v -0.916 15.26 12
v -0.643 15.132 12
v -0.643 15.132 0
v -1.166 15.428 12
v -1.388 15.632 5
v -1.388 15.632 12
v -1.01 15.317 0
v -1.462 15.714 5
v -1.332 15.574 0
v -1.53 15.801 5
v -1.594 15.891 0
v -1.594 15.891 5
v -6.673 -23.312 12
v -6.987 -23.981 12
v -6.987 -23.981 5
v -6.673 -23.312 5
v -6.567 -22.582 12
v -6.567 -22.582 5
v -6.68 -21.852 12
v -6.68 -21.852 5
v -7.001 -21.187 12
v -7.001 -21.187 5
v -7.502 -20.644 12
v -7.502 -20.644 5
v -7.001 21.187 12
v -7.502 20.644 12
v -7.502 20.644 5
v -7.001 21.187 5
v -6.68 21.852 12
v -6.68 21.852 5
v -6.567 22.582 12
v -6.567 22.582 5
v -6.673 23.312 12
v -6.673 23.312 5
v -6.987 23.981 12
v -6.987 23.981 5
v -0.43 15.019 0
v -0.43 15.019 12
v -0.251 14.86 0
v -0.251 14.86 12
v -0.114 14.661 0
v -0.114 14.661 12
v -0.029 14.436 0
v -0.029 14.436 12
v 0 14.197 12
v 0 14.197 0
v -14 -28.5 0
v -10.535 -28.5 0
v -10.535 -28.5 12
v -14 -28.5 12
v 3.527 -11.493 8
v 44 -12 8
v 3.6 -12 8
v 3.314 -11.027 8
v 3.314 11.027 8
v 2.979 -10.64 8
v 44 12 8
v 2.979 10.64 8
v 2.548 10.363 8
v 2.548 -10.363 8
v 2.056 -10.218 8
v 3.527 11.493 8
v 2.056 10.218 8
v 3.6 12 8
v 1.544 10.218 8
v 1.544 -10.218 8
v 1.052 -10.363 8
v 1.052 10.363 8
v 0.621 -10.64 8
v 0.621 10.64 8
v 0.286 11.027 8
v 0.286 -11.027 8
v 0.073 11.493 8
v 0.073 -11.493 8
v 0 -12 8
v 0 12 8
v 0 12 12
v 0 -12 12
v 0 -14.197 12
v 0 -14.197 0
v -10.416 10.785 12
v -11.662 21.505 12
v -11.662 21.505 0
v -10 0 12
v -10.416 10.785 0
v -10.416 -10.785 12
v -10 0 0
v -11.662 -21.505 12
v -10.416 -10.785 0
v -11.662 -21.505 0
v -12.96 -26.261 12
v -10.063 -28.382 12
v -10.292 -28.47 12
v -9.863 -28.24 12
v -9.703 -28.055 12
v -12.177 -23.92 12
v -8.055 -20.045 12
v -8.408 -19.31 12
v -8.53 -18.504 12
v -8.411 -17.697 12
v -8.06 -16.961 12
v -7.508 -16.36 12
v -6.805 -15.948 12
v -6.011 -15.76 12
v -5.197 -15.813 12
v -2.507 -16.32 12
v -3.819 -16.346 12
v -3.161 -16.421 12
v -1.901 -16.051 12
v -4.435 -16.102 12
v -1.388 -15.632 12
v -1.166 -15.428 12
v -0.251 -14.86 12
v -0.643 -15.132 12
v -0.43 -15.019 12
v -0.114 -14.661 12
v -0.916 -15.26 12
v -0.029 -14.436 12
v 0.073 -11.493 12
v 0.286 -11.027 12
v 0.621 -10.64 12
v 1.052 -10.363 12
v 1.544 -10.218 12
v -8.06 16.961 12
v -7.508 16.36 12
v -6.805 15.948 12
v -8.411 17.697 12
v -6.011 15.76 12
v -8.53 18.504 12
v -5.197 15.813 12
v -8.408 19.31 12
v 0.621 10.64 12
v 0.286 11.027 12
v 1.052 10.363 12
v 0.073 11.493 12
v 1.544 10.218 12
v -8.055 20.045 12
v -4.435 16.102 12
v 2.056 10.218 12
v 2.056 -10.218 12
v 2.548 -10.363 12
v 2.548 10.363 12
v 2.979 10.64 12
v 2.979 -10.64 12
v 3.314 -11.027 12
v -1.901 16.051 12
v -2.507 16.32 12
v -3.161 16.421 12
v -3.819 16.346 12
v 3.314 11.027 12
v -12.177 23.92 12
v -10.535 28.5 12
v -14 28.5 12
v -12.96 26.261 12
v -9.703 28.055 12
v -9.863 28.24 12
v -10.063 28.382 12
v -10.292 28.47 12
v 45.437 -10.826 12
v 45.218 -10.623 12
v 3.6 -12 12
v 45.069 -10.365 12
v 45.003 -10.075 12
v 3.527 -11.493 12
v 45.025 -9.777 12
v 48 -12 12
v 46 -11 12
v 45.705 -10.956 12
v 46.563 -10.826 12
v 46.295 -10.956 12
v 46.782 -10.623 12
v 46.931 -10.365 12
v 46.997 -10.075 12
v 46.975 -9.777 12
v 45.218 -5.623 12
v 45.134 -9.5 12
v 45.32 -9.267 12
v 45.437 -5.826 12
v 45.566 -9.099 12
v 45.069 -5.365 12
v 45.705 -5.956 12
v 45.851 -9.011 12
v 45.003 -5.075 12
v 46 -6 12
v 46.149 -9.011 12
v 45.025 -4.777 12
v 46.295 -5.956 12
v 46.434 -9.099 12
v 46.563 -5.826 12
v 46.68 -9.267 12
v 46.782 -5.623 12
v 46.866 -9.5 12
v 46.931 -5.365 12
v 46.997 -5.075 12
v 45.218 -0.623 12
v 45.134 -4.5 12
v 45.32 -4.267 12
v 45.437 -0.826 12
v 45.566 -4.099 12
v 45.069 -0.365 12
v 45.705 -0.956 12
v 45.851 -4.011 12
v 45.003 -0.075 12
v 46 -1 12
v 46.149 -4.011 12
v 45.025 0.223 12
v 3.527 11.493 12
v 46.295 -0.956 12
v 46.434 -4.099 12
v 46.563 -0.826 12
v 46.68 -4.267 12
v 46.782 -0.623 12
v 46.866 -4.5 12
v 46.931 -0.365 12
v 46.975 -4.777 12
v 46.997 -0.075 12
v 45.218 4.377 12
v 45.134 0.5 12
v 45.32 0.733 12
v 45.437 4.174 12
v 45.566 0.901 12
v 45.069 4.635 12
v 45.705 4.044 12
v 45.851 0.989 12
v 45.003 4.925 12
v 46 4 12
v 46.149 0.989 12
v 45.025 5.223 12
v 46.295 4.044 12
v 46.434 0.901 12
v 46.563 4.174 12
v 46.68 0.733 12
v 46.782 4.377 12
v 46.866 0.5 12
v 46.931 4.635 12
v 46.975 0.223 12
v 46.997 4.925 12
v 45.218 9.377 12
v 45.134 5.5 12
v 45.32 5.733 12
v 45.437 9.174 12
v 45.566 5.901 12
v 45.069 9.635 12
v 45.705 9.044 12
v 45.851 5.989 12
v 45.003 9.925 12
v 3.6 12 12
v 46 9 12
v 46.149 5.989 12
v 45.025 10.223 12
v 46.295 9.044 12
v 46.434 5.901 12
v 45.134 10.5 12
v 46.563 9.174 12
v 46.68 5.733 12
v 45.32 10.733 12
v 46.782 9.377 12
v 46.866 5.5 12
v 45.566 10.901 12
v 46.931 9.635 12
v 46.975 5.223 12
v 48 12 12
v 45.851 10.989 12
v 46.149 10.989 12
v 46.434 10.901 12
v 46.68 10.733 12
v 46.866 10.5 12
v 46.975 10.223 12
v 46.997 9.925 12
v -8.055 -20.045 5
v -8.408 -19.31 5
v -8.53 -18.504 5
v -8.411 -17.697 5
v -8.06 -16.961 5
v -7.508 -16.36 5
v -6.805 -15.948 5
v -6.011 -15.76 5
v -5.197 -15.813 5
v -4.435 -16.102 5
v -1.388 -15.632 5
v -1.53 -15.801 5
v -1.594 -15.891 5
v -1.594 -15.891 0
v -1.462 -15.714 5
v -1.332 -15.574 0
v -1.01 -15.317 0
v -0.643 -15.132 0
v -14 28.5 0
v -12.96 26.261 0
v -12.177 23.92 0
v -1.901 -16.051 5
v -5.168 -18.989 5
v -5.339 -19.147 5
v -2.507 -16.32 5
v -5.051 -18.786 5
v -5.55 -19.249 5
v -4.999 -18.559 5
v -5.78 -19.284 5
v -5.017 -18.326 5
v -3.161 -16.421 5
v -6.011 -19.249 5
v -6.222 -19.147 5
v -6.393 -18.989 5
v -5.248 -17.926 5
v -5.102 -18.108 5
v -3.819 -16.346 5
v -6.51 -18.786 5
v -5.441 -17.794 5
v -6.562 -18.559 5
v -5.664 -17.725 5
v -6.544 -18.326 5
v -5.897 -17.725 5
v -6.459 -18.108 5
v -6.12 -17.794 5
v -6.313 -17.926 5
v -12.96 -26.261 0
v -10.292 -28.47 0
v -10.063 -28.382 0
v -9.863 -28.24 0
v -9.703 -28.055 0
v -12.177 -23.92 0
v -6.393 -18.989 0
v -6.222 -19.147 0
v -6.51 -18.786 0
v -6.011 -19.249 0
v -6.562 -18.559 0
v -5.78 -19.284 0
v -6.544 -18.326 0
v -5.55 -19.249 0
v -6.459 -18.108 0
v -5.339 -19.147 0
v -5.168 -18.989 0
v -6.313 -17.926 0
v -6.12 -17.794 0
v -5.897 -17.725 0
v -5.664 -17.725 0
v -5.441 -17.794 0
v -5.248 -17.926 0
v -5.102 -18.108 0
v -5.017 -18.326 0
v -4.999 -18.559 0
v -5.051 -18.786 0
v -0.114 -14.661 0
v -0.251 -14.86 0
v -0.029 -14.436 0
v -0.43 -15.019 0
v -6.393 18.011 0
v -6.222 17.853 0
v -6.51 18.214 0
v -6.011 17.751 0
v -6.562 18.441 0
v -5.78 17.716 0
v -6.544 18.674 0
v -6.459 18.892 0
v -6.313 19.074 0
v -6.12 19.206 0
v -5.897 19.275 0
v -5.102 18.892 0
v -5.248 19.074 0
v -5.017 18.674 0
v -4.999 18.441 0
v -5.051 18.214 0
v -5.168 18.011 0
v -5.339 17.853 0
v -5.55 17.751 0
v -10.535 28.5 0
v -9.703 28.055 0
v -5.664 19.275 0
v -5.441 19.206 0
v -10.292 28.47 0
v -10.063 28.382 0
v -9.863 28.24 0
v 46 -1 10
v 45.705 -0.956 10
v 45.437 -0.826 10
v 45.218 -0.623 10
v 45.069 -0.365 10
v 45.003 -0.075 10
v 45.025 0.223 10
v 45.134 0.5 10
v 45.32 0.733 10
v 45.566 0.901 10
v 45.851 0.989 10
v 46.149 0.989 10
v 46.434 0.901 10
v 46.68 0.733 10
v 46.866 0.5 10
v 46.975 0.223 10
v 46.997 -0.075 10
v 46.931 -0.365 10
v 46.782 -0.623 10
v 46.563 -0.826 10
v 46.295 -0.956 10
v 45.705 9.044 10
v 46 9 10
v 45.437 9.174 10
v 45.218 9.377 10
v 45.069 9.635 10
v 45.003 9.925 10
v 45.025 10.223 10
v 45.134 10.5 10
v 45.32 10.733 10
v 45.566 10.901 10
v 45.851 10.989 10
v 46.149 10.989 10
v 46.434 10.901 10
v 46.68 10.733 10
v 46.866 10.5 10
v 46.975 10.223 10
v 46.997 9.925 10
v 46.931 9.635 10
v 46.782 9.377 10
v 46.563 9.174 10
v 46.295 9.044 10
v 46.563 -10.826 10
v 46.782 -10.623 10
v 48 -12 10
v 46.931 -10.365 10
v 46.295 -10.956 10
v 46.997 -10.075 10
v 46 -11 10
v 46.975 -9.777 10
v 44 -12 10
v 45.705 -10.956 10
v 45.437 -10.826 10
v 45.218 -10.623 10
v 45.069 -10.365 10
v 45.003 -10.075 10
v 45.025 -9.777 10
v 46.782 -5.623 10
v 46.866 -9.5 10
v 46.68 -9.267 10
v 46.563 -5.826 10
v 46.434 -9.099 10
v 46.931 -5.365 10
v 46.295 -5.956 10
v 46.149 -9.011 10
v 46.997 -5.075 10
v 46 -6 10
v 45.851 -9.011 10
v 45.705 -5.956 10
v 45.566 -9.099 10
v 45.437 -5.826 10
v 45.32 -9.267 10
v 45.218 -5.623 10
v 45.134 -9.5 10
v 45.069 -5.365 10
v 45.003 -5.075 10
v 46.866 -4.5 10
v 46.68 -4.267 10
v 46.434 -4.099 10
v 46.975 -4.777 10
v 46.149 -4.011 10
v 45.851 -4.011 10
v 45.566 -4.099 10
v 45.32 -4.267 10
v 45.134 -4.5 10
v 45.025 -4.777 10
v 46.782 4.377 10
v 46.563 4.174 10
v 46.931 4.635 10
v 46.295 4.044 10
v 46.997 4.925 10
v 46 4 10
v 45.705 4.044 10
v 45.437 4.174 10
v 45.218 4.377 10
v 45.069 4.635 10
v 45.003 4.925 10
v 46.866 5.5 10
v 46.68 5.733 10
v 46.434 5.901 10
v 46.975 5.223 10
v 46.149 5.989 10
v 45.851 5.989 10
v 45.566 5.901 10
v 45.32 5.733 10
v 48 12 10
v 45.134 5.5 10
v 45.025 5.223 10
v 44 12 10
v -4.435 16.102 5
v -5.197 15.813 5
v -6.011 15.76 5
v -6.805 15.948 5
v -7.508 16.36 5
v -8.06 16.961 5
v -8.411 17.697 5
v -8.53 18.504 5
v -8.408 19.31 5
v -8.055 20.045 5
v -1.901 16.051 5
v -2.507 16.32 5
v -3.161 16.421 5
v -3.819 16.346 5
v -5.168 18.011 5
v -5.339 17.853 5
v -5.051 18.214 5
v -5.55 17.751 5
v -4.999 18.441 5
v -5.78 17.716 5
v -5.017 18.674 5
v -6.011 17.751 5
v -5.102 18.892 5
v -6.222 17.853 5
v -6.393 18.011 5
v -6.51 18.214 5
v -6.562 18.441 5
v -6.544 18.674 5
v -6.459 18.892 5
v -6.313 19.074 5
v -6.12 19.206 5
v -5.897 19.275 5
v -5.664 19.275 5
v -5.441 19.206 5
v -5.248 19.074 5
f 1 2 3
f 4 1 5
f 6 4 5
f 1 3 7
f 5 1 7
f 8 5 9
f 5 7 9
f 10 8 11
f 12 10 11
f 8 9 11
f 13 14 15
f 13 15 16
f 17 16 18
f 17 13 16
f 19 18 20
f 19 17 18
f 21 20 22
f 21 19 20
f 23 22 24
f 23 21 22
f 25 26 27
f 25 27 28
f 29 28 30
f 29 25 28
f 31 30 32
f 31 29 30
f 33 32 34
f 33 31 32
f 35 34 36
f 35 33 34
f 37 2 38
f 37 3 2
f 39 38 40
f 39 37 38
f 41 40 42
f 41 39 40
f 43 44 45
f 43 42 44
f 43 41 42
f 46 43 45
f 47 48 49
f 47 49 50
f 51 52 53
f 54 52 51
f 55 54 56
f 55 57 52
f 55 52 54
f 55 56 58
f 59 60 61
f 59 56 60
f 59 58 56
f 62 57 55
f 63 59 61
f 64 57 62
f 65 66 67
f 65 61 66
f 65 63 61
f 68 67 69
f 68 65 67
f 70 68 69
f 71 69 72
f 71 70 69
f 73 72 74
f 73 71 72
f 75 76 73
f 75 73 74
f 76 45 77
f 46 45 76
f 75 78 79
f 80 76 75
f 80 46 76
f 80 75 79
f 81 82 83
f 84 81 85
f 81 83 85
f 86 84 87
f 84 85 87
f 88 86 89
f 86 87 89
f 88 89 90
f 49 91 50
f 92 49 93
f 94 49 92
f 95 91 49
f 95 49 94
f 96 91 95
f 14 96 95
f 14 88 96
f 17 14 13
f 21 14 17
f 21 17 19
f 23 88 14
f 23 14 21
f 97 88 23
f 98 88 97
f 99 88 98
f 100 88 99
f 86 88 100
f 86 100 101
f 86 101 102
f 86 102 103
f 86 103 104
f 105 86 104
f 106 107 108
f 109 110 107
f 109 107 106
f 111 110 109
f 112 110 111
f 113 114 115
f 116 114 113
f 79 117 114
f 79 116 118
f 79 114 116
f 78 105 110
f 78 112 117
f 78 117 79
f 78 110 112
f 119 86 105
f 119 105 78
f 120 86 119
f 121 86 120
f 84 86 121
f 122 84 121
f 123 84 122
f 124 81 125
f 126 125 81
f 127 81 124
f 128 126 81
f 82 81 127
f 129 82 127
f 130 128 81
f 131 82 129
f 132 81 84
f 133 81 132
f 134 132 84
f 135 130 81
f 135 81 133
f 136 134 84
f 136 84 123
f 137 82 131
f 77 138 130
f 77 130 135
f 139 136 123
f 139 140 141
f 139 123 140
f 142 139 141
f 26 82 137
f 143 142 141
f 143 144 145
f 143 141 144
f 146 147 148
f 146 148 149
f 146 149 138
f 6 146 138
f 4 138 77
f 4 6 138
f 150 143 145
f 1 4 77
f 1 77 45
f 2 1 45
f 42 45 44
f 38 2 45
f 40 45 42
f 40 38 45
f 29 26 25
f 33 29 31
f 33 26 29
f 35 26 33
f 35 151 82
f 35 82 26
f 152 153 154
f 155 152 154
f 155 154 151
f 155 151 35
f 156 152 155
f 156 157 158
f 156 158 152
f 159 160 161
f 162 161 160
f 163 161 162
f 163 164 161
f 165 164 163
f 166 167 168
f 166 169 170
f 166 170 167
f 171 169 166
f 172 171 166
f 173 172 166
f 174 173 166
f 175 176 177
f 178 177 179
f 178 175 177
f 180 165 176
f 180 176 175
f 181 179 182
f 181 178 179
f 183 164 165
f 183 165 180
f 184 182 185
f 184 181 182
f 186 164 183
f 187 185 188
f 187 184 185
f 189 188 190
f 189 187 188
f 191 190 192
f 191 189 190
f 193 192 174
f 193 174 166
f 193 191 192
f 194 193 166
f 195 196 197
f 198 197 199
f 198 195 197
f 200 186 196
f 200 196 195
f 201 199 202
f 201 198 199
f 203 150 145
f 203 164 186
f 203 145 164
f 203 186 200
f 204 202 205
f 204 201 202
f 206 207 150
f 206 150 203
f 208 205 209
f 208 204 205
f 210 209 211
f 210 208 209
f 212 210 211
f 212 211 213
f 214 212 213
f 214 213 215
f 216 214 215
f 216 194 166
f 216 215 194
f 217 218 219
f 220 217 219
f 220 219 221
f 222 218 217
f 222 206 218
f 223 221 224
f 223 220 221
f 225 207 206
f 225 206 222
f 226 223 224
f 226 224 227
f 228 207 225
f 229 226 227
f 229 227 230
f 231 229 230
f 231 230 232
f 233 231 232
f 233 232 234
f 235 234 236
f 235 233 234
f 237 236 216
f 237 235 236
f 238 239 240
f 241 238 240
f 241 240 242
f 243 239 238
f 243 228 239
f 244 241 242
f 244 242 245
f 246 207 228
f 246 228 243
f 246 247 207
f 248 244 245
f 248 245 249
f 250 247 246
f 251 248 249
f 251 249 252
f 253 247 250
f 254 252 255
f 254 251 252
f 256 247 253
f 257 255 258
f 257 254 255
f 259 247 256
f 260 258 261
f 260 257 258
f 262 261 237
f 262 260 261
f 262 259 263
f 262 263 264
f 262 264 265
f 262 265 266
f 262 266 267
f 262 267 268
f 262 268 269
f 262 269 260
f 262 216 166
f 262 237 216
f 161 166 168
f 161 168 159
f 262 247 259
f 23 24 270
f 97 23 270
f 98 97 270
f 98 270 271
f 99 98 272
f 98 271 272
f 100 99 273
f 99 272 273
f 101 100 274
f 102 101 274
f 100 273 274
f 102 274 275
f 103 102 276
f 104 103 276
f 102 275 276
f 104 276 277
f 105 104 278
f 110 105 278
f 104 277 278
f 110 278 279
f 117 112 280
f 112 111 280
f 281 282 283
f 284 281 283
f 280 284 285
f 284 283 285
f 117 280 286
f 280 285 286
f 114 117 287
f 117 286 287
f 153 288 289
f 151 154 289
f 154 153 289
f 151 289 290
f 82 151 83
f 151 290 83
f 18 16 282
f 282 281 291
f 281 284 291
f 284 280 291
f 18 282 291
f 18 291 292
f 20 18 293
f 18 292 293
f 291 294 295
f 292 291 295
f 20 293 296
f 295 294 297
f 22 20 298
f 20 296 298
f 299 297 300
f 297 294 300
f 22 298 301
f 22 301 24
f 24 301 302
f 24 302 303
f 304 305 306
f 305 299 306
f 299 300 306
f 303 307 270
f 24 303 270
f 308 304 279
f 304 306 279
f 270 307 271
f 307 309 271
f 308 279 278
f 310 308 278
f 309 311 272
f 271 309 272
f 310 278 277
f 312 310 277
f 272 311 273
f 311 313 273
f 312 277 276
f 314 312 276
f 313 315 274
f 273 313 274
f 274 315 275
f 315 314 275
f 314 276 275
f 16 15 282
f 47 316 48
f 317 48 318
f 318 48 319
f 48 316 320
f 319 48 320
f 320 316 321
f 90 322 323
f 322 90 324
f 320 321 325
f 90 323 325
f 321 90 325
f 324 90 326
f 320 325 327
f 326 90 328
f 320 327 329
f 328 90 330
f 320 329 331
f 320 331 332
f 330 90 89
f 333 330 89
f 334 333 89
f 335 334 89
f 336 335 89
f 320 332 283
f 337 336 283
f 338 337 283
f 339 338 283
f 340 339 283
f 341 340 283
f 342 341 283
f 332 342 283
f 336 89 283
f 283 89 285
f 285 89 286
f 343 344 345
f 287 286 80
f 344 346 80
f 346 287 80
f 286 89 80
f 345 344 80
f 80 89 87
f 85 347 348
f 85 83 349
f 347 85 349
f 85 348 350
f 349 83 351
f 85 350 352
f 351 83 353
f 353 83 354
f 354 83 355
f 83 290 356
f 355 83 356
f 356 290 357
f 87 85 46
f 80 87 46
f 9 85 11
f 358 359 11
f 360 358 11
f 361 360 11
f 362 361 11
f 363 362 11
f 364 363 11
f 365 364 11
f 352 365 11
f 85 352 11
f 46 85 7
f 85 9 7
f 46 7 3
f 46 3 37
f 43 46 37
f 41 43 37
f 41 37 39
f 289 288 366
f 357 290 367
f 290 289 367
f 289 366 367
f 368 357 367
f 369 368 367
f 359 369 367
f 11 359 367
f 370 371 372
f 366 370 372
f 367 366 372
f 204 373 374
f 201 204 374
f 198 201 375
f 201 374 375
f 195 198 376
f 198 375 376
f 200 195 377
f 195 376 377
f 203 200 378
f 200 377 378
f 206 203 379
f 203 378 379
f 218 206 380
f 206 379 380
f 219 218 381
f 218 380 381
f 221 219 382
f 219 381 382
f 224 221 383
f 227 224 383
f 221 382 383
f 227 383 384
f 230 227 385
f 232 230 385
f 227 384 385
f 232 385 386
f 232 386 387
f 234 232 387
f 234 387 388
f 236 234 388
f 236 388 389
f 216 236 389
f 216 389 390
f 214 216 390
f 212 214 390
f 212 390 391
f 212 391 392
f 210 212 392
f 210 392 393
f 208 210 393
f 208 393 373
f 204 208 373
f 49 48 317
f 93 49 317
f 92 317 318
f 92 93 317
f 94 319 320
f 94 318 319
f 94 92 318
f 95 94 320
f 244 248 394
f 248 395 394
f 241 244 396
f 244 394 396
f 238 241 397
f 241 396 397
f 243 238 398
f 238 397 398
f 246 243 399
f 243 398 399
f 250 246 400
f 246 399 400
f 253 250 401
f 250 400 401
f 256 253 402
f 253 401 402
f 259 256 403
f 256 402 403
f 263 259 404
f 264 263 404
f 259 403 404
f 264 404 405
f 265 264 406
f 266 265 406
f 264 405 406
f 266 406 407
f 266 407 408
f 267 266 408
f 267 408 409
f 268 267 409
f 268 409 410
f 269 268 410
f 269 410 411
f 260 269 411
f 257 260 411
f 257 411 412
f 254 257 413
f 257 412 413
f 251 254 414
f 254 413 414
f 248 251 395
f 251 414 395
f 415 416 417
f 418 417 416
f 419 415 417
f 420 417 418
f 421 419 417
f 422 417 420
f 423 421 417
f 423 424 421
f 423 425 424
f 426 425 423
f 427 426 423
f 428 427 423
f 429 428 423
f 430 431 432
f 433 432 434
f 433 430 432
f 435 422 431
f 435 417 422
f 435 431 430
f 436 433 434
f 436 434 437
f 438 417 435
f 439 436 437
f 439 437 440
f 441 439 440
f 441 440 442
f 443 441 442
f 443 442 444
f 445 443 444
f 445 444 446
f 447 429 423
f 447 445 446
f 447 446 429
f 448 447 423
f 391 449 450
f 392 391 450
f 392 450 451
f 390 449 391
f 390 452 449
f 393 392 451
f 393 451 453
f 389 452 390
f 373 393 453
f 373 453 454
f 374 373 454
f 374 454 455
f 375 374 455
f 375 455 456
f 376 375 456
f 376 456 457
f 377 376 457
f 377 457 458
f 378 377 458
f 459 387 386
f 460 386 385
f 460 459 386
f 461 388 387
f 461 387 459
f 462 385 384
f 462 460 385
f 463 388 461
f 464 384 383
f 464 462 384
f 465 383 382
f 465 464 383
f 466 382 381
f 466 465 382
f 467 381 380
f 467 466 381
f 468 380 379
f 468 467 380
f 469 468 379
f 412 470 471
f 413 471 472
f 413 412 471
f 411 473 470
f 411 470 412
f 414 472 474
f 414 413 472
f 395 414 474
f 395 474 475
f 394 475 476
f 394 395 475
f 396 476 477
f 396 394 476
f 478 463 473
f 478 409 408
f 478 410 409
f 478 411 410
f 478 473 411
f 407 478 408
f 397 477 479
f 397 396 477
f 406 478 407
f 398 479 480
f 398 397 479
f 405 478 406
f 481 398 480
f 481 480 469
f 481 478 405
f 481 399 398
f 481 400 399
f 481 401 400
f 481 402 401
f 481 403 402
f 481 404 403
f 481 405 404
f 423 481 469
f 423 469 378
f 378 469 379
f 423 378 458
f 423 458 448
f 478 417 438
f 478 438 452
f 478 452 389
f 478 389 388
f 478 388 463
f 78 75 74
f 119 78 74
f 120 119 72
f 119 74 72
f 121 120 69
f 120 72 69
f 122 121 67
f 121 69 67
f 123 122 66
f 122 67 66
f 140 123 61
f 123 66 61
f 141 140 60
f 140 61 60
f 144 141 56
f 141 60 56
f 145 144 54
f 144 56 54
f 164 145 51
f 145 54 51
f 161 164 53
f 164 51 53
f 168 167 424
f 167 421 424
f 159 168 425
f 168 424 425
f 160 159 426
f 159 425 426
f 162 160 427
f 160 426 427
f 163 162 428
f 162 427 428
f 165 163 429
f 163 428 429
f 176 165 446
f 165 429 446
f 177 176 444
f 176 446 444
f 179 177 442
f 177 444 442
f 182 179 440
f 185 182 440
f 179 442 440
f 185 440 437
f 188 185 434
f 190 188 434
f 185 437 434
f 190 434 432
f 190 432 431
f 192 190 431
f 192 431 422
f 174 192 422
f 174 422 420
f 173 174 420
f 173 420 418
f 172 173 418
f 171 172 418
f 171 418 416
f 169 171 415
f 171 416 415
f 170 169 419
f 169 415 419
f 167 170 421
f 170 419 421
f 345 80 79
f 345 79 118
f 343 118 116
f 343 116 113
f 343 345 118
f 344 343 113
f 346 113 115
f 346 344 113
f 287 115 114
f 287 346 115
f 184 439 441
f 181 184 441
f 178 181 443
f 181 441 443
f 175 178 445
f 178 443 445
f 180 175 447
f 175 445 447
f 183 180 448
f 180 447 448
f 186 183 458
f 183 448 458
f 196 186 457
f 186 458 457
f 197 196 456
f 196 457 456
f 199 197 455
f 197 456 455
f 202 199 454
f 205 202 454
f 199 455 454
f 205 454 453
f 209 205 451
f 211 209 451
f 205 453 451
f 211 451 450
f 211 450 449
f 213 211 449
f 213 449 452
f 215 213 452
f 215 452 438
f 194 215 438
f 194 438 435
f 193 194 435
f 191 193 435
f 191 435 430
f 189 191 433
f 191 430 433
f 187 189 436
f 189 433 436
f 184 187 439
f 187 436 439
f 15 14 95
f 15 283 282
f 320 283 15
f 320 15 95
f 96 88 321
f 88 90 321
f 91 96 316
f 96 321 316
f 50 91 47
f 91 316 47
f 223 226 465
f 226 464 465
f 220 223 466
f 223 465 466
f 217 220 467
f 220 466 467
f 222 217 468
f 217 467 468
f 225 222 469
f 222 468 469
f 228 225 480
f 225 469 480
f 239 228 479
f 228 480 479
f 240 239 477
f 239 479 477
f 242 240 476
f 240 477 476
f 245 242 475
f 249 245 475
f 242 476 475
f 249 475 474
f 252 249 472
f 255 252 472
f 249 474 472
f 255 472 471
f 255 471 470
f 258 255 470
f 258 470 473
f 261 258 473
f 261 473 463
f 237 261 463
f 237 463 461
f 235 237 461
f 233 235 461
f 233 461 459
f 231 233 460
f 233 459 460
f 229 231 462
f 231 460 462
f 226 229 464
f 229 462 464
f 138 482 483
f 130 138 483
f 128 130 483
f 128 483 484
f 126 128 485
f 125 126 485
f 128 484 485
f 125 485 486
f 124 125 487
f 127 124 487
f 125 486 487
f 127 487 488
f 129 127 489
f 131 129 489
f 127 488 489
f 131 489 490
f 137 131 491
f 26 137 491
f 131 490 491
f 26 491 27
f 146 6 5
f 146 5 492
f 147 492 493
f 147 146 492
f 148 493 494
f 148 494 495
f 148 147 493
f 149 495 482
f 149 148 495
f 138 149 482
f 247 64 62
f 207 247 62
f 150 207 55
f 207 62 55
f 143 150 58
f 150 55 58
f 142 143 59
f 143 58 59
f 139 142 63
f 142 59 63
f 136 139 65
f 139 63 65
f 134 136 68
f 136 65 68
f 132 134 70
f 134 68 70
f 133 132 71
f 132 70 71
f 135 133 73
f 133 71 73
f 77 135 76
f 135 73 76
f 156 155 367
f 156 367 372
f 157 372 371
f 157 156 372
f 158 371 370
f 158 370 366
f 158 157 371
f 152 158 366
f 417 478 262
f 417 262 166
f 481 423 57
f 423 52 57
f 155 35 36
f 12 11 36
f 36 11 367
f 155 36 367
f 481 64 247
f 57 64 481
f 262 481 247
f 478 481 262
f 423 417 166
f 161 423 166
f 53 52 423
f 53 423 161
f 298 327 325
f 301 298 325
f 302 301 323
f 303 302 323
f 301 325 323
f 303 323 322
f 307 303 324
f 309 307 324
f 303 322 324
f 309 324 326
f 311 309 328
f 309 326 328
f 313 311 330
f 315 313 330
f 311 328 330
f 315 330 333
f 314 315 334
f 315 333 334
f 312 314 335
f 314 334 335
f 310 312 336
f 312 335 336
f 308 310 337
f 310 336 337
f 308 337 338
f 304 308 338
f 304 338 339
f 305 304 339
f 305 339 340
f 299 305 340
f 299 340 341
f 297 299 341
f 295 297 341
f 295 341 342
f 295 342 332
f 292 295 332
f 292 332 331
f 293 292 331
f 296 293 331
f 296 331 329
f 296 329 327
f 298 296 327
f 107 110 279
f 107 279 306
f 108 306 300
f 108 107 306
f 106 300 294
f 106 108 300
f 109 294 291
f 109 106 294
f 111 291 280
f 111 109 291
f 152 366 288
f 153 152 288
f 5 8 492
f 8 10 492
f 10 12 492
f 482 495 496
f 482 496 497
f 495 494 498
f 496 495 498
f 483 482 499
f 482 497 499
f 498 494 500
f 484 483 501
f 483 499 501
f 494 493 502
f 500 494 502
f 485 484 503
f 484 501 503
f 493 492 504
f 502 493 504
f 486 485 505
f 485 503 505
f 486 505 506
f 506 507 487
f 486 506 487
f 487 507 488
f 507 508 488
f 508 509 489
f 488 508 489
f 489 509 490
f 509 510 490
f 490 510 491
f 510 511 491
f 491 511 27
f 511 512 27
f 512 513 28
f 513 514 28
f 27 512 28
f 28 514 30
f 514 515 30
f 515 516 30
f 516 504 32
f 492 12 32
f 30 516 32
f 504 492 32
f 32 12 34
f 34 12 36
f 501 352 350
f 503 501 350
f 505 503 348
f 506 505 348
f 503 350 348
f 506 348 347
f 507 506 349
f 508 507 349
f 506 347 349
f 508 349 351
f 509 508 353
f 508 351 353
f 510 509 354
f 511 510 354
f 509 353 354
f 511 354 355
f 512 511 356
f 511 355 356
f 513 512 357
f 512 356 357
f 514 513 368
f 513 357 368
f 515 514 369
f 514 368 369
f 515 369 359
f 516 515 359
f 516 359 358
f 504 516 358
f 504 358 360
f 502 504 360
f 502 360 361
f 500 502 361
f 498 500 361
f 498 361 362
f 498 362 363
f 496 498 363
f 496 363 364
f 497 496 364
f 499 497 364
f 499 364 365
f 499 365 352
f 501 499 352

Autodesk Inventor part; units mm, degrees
ref_plane "YZ Plane" through (0, 0, 0) normal (1, 0, 0) x (0, 1, 0)
ref_plane "XZ Plane" through (0, 0, 0) normal (0, 1, 0) x (-1, 0, 0)
ref_plane "XY Plane" through (0, 0, 0) normal (0, 0, 1) x (1, 0, 0)
sketch "Skizze1" plane through (0, 0, 0) normal (0, 0, 1) x (1, 0, 0)
  line L0 (3.6, 12) -> (48, 12)
  line L1 (48, 12) -> (48, -12)
  line L2 (48, -12) -> (3.6, -12)
  line L3 (-189.6, 0) -> (87.6, 0) projected
  line L4 (-1, 15) -> (-10, 28.5)
  line L5 (-1, -15) -> (-10, -28.5)
  line L6 (-10, -28.5) -> (-14, -28.5)
  line L7 (-10, 28.5) -> (-14, 28.5)
  arc A0 (-11.6616, 21.5053) -> (-14, 28.5) centre (-33.4005, 18.1259) ccw
  arc A1 (-14, -28.5) -> (-11.6616, -21.5053) centre (-33.4005, -18.1259) ccw
  arc A2 (-11.6616, -21.5053) -> (-11.6616, 21.5053) centre (-150, 0) ccw
  line L8 (-10, 28.5) -> (-10, -28.5) construction
  line L9 (0, 40.0382) -> (0, -40.0382) projected
  line L10 (-2, 12.5) -> (-2, -9.8115) construction
  arc A3 (0, 12) -> (3.6, 12) centre (1.8, 12) ccw
  arc A4 (3.6, -12) -> (0, -12) centre (1.8, -12) ccw
  line L11 (0, 12) -> (0, 15)
  line L12 (0, 15) -> (-1, 15)
  line L13 (0, -12) -> (0, -15)
  line L14 (0, -15) -> (-1, -15)
  point P0 (0, 0)
  dimension "d2" = 24
  dimension "d51" = 22
  dimension "d52" = 140
  dimension "d54" = 4
  dimension "d55" = 57
  dimension "d59" = 8
  dimension "d60" = 2
  dimension "d64" = 0
  dimension "d73" = 1.8
  dimension "d75" = 48
  dimension "d76" = 30
  dimension "d77" = 1
extrude "Extrusion1" add sketch "Skizze1" along normal blind 12
sketch "Skizze8" plane through (0, 0, 12) normal (0, 0, 1) x (1, 0, 0)
  line L0 (-189.6, 0) -> (87.6, 0) projected
  arc A0 (-11.6616, -21.5053) -> (-11.6616, 21.5053) centre (-150, 0) ccw projected
  line L1 (-1, 15) -> (-10, 28.5) projected
  line L2 (-11.2277, 18.5) -> (-3.3333, 18.5) construction
  point P0 (0, 0)
  point P1 (-5.7805, 18.5)
  point P2 (-5.7805, -18.5)
  point P3 (-7.2805, 18.5)
  dimension "d65" = 18.5
  dimension "d80" = 1.5
hole "Bohrung4" at (-5.7805, 18.5, 12) at (-5.7805, -18.5, 12) direction (0, 0, -1) diameter 1.567 end through all counterbore diameter 5.5 counterbore depth 7 thread size "M2x0.4" class "6H" standard "ISO Metric profile"
sketch "Skizze2" plane through (0, 0, 0) normal (0, 0, -1) x (-1, 0, 0)
  line L0 (-48, -12) -> (-3.6, -12) projected
  line L1 (-48, 12) -> (-48, -12) projected
  line L2 (-48, 12) -> (-3.6, 12) projected
  line L3 (0, -12) -> (-48, -12)
  line L4 (-48, -12) -> (-48, 12)
  line L5 (-48, 12) -> (0, 12)
  line L6 (-3.6, 12) -> (-48, 12) projected
  line L7 (0, 12) -> (0, -12)
  point P0 (0, 0)
  point P1 (0, -12.5)
  point P2 (0, 12.5)
  point P3 (-3.6, -12)
extrude "Extrusion2" cut sketch "Skizze2" against normal blind 8
sketch "Skizze3" plane through (0, 0, 8) normal (0, 0, -1) x (-1, 0, 0)
  line L0 (-3.6, -12) -> (-48, -12) projected
  line L1 (-48, -12) -> (-48, 12) projected
  line L2 (-48, 12) -> (-3.6, 12) projected
  line L3 (-48, -12) -> (-44, -12)
  line L4 (-44, -12) -> (-44, 12)
  line L5 (-44, 12) -> (-48, 12)
  line L6 (-48, 12) -> (-48, -12)
  point P0 (0, 0)
  point P1 (0, -12.5)
  point P2 (0, 12.5)
  point P3 (10, -12.5)
  point P4 (-3.6, 12)
  dimension "d9" = 4
extrude "Extrusion3" cut sketch "Skizze3" against normal blind 2
sketch "Skizze4" plane through (0, 0, 12) normal (0, 0, 1) x (1, 0, 0)
  line L0 (48, -12) -> (48, 12) projected
  line L1 (-26.4, 0) -> (60.4, 0) projected
  point P0 (0, 0)
  point P1 (46, 0)
  dimension "d12" = 2
hole "Bohrung1" at (46, 0, 12) direction (0, 0, -1) diameter 2 end through all
pattern_linear "Rechteckige Anordnung1" count 5 spacing 5 along (0, 1, 0) of "Bohrung1" first direction both ways yes
sketch "Skizze7" plane through (0, 0, 12) normal (0, 0, 1) x (1, 0, 0)
  line L0 (-1, 15) -> (-3.061, 18.0915) projected
  line L1 (-10, 28.5) -> (-14, 28.5) projected
  arc A0 (-11.6616, 21.5053) -> (-14, 28.5) centre (-33.4005, 18.1259) ccw projected
  arc A1 (-11.6616, -21.5053) -> (-11.6616, 21.5053) centre (-150, 0) ccw projected
  arc A2 (-14, -28.5) -> (-11.6616, -21.5053) centre (-33.4005, -18.1259) ccw projected
  line L2 (-14, -28.5) -> (-10, -28.5) projected
  line L3 (-10, -28.5) -> (-5.1116, -21.1674) projected
  line L4 (3.6, -12) -> (48, -12) projected
  line L5 (48, -12) -> (48, 12) projected
  line L6 (48, 12) -> (3.6, 12) projected
  line L7 (-3, 28.5) -> (-14, 28.5)
  line L8 (-14, 28.5) -> (-14, -28.5)
  line L9 (-14, -28.5) -> (-3, -28.5)
  line L10 (-3, -28.5) -> (-3, 28.5)
  line L11 (-10, 28.5) -> (-14, 28.5) projected
  line L12 (-14, -28.5) -> (-10, -28.5) projected
  line L13 (0, 12) -> (0, 15) projected
  line L14 (0, 15) -> (-1, 15) projected
  line L15 (-1, -15) -> (0, -15) projected
  line L16 (0, -15) -> (0, -12) projected
  arc A3 (3.6, -12) -> (0, -12) centre (1.8, -12) ccw projected
  arc A4 (0, 12) -> (3.6, 12) centre (1.8, 12) ccw projected
  arc A5 (-5.1116, 21.1674) -> (-3.061, 18.0915) centre (-5.7805, 18.5) ccw projected
  arc A6 (-3.061, -18.0915) -> (-5.1116, -21.1674) centre (-5.7805, -18.5) ccw projected
  line L17 (-1, -15) -> (0, -15) projected
  line L18 (0, 15) -> (-1, 15) projected
  line L19 (-194.4, 0) -> (88.4, 0) projected
  line L20 (-1, 15) -> (-2, 15)
  line L21 (0, -15) -> (-1, -15) projected
  line L22 (-2, -15) -> (-1, -15)
  line L23 (-5.1116, 21.1674) -> (-10, 28.5) projected
  line L24 (-3.061, -18.0915) -> (-1, -15) projected
  point P0 (0.6841, -13.8749)
  point P1 (0, 0)
  point P2 (-3, -14)
  point P3 (-3, 14)
  dimension "d86" = 3
extrude "Extrusion4" [suppressed]
fillet "Rundung1" radius 2 2 edges at (-1, -15, 6) (-1, 15, 6)
fillet "Rundung2" radius 1 4 edges at (-10, -28.5, 6) (-10, 28.5, 6) (0, -15.0012, 6) (0, 15.0012, 6)
fillet "Rundung3" radius 2.5 4 edges at (-5.1116, -21.1674, 8.5) (-3.061, -18.0915, 8.5) (-5.1116, 21.1674, 8.5) (-3.061, 18.0915, 8.5)
chamfer "Fase1" [suppressed]
sketch "Skizze9" plane through (0, 0, 7) normal (0, 0, 1) x (1, 0, 0)
  arc A0 (-10.4764, 20.7604) -> (-7.2043, 16.343) centre (-8.9101, 18.5) ccw projected
  line L0 (-12.7002, 28.0952) -> (-9.8914, 24.3034) projected
  arc A1 (-12.7002, 28.0952) -> (-13.5037, 28.5) centre (-13.5037, 27.5) ccw projected
  line L1 (-18, 28.5) -> (-13.5037, 28.5) projected
  arc A2 (-15.6616, 21.5053) -> (-18, 28.5) centre (-37.4005, 18.1259) ccw projected
  arc A3 (-15.6616, -21.5053) -> (-15.6616, 21.5053) centre (-154, 0) ccw projected
  arc A4 (-18, -28.5) -> (-15.6616, -21.5053) centre (-37.4005, -18.1259) ccw projected
  line L2 (-13.5037, -28.5) -> (-18, -28.5) projected
  arc A5 (-13.5037, -28.5) -> (-12.7002, -28.0952) centre (-13.5037, -27.5) ccw projected
  line L3 (-9.8914, -24.3034) -> (-12.7002, -28.0952) projected
  arc A6 (-7.2043, -16.343) -> (-10.4764, -20.7604) centre (-8.9101, -18.5) ccw projected
  line L4 (-3, 12) -> (-4, 12)
  line L5 (-4, 12) -> (-4, -12)
  line L6 (-4, -12) -> (-3, -12)
  line L7 (-3, -12) -> (-3, 12)
  line L8 (-194.4, 0) -> (88.4, 0) projected
  line L9 (-3, 15.2723) -> (-3, -15.2723) projected
  arc A7 (-3, -15.2723) -> (-3.5997, -15.8095) centre (-1.9925, -17) ccw projected
  arc A8 (-3.5997, 15.8095) -> (-3, 15.2723) centre (-1.9925, 17) ccw projected
  arc A9 (-3.6446, 15.8702) -> (-7.2043, 16.343) centre (-5.6535, 14.3821) ccw projected
  arc A10 (-10.4764, 20.7604) -> (-9.8914, 24.3034) centre (-11.9003, 22.8153) ccw projected
  arc A11 (-9.8914, -24.3034) -> (-10.4764, -20.7604) centre (-11.9003, -22.8153) ccw projected
  arc A12 (-7.2043, -16.343) -> (-3.6446, -15.8702) centre (-5.6535, -14.3821) ccw projected
  line L10 (-3.5997, -15.8095) -> (-3.6446, -15.8702) projected
  line L11 (-3.6446, 15.8702) -> (-3.5997, 15.8095) projected
  point P0 (0, 0)
  dimension "d88" = 1
  dimension "d89" = 24
extrude "Extrusion5" [suppressed]
sketch "Skizze10" plane through (0, 0, 7) normal (0, 0, 1) x (1, 0, 0)
  arc A0 (-10.4764, 20.7604) -> (-7.2043, 16.343) centre (-8.9101, 18.5) ccw projected
  arc A1 (-12.7002, 28.0952) -> (-13.5037, 28.5) centre (-13.5037, 27.5) ccw projected
  line L0 (-18, 28.5) -> (-13.5037, 28.5) projected
  arc A2 (-15.6616, 21.5053) -> (-18, 28.5) centre (-37.4005, 18.1259) ccw projected
  arc A3 (-15.6616, -21.5053) -> (-15.6616, 21.5053) centre (-154, 0) ccw projected
  arc A4 (-18, -28.5) -> (-15.6616, -21.5053) centre (-37.4005, -18.1259) ccw projected
  line L1 (-13.5037, -28.5) -> (-18, -28.5) projected
  arc A5 (-13.5037, -28.5) -> (-12.7002, -28.0952) centre (-13.5037, -27.5) ccw projected
  line L2 (-9.8914, -24.3034) -> (-12.7002, -28.0952) projected
  arc A6 (-7.2043, -16.343) -> (-10.4764, -20.7604) centre (-8.9101, -18.5) ccw projected
  line L3 (-4, 12) -> (-5, 12)
  line L4 (-5, 12) -> (-5, -12)
  line L5 (-5, -12) -> (-4, -12)
  line L6 (-4, -12) -> (-4, 12)
  line L7 (-3, 15.2723) -> (-3, -15.2723) projected
  line L8 (-12.7002, 28.0952) -> (-9.8914, 24.3034) projected
  arc A7 (-3.5997, 15.8095) -> (-3, 15.2723) centre (-1.9925, 17) ccw projected
  arc A8 (-3, -15.2723) -> (-3.5997, -15.8095) centre (-1.9925, -17) ccw projected
  line L9 (-3.6446, 15.8702) -> (-3.5997, 15.8095) projected
  arc A9 (-3.6446, 15.8702) -> (-7.2043, 16.343) centre (-5.6535, 14.3821) ccw projected
  arc A10 (-10.4764, 20.7604) -> (-9.8914, 24.3034) centre (-11.9003, 22.8153) ccw projected
  arc A11 (-9.8914, -24.3034) -> (-10.4764, -20.7604) centre (-11.9003, -22.8153) ccw projected
  arc A12 (-7.2043, -16.343) -> (-3.6446, -15.8702) centre (-5.6535, -14.3821) ccw projected
  line L10 (-3.5997, -15.8095) -> (-3.6446, -15.8702) projected
  point P0 (0, 0)
  dimension "d92" = 1
extrude "Extrusion6" [suppressed]
fillet "Rundung4" [suppressed]
chamfer "Fase3" [suppressed]
properties part number "Kicker Sichel" material "Aluminium 6061"
